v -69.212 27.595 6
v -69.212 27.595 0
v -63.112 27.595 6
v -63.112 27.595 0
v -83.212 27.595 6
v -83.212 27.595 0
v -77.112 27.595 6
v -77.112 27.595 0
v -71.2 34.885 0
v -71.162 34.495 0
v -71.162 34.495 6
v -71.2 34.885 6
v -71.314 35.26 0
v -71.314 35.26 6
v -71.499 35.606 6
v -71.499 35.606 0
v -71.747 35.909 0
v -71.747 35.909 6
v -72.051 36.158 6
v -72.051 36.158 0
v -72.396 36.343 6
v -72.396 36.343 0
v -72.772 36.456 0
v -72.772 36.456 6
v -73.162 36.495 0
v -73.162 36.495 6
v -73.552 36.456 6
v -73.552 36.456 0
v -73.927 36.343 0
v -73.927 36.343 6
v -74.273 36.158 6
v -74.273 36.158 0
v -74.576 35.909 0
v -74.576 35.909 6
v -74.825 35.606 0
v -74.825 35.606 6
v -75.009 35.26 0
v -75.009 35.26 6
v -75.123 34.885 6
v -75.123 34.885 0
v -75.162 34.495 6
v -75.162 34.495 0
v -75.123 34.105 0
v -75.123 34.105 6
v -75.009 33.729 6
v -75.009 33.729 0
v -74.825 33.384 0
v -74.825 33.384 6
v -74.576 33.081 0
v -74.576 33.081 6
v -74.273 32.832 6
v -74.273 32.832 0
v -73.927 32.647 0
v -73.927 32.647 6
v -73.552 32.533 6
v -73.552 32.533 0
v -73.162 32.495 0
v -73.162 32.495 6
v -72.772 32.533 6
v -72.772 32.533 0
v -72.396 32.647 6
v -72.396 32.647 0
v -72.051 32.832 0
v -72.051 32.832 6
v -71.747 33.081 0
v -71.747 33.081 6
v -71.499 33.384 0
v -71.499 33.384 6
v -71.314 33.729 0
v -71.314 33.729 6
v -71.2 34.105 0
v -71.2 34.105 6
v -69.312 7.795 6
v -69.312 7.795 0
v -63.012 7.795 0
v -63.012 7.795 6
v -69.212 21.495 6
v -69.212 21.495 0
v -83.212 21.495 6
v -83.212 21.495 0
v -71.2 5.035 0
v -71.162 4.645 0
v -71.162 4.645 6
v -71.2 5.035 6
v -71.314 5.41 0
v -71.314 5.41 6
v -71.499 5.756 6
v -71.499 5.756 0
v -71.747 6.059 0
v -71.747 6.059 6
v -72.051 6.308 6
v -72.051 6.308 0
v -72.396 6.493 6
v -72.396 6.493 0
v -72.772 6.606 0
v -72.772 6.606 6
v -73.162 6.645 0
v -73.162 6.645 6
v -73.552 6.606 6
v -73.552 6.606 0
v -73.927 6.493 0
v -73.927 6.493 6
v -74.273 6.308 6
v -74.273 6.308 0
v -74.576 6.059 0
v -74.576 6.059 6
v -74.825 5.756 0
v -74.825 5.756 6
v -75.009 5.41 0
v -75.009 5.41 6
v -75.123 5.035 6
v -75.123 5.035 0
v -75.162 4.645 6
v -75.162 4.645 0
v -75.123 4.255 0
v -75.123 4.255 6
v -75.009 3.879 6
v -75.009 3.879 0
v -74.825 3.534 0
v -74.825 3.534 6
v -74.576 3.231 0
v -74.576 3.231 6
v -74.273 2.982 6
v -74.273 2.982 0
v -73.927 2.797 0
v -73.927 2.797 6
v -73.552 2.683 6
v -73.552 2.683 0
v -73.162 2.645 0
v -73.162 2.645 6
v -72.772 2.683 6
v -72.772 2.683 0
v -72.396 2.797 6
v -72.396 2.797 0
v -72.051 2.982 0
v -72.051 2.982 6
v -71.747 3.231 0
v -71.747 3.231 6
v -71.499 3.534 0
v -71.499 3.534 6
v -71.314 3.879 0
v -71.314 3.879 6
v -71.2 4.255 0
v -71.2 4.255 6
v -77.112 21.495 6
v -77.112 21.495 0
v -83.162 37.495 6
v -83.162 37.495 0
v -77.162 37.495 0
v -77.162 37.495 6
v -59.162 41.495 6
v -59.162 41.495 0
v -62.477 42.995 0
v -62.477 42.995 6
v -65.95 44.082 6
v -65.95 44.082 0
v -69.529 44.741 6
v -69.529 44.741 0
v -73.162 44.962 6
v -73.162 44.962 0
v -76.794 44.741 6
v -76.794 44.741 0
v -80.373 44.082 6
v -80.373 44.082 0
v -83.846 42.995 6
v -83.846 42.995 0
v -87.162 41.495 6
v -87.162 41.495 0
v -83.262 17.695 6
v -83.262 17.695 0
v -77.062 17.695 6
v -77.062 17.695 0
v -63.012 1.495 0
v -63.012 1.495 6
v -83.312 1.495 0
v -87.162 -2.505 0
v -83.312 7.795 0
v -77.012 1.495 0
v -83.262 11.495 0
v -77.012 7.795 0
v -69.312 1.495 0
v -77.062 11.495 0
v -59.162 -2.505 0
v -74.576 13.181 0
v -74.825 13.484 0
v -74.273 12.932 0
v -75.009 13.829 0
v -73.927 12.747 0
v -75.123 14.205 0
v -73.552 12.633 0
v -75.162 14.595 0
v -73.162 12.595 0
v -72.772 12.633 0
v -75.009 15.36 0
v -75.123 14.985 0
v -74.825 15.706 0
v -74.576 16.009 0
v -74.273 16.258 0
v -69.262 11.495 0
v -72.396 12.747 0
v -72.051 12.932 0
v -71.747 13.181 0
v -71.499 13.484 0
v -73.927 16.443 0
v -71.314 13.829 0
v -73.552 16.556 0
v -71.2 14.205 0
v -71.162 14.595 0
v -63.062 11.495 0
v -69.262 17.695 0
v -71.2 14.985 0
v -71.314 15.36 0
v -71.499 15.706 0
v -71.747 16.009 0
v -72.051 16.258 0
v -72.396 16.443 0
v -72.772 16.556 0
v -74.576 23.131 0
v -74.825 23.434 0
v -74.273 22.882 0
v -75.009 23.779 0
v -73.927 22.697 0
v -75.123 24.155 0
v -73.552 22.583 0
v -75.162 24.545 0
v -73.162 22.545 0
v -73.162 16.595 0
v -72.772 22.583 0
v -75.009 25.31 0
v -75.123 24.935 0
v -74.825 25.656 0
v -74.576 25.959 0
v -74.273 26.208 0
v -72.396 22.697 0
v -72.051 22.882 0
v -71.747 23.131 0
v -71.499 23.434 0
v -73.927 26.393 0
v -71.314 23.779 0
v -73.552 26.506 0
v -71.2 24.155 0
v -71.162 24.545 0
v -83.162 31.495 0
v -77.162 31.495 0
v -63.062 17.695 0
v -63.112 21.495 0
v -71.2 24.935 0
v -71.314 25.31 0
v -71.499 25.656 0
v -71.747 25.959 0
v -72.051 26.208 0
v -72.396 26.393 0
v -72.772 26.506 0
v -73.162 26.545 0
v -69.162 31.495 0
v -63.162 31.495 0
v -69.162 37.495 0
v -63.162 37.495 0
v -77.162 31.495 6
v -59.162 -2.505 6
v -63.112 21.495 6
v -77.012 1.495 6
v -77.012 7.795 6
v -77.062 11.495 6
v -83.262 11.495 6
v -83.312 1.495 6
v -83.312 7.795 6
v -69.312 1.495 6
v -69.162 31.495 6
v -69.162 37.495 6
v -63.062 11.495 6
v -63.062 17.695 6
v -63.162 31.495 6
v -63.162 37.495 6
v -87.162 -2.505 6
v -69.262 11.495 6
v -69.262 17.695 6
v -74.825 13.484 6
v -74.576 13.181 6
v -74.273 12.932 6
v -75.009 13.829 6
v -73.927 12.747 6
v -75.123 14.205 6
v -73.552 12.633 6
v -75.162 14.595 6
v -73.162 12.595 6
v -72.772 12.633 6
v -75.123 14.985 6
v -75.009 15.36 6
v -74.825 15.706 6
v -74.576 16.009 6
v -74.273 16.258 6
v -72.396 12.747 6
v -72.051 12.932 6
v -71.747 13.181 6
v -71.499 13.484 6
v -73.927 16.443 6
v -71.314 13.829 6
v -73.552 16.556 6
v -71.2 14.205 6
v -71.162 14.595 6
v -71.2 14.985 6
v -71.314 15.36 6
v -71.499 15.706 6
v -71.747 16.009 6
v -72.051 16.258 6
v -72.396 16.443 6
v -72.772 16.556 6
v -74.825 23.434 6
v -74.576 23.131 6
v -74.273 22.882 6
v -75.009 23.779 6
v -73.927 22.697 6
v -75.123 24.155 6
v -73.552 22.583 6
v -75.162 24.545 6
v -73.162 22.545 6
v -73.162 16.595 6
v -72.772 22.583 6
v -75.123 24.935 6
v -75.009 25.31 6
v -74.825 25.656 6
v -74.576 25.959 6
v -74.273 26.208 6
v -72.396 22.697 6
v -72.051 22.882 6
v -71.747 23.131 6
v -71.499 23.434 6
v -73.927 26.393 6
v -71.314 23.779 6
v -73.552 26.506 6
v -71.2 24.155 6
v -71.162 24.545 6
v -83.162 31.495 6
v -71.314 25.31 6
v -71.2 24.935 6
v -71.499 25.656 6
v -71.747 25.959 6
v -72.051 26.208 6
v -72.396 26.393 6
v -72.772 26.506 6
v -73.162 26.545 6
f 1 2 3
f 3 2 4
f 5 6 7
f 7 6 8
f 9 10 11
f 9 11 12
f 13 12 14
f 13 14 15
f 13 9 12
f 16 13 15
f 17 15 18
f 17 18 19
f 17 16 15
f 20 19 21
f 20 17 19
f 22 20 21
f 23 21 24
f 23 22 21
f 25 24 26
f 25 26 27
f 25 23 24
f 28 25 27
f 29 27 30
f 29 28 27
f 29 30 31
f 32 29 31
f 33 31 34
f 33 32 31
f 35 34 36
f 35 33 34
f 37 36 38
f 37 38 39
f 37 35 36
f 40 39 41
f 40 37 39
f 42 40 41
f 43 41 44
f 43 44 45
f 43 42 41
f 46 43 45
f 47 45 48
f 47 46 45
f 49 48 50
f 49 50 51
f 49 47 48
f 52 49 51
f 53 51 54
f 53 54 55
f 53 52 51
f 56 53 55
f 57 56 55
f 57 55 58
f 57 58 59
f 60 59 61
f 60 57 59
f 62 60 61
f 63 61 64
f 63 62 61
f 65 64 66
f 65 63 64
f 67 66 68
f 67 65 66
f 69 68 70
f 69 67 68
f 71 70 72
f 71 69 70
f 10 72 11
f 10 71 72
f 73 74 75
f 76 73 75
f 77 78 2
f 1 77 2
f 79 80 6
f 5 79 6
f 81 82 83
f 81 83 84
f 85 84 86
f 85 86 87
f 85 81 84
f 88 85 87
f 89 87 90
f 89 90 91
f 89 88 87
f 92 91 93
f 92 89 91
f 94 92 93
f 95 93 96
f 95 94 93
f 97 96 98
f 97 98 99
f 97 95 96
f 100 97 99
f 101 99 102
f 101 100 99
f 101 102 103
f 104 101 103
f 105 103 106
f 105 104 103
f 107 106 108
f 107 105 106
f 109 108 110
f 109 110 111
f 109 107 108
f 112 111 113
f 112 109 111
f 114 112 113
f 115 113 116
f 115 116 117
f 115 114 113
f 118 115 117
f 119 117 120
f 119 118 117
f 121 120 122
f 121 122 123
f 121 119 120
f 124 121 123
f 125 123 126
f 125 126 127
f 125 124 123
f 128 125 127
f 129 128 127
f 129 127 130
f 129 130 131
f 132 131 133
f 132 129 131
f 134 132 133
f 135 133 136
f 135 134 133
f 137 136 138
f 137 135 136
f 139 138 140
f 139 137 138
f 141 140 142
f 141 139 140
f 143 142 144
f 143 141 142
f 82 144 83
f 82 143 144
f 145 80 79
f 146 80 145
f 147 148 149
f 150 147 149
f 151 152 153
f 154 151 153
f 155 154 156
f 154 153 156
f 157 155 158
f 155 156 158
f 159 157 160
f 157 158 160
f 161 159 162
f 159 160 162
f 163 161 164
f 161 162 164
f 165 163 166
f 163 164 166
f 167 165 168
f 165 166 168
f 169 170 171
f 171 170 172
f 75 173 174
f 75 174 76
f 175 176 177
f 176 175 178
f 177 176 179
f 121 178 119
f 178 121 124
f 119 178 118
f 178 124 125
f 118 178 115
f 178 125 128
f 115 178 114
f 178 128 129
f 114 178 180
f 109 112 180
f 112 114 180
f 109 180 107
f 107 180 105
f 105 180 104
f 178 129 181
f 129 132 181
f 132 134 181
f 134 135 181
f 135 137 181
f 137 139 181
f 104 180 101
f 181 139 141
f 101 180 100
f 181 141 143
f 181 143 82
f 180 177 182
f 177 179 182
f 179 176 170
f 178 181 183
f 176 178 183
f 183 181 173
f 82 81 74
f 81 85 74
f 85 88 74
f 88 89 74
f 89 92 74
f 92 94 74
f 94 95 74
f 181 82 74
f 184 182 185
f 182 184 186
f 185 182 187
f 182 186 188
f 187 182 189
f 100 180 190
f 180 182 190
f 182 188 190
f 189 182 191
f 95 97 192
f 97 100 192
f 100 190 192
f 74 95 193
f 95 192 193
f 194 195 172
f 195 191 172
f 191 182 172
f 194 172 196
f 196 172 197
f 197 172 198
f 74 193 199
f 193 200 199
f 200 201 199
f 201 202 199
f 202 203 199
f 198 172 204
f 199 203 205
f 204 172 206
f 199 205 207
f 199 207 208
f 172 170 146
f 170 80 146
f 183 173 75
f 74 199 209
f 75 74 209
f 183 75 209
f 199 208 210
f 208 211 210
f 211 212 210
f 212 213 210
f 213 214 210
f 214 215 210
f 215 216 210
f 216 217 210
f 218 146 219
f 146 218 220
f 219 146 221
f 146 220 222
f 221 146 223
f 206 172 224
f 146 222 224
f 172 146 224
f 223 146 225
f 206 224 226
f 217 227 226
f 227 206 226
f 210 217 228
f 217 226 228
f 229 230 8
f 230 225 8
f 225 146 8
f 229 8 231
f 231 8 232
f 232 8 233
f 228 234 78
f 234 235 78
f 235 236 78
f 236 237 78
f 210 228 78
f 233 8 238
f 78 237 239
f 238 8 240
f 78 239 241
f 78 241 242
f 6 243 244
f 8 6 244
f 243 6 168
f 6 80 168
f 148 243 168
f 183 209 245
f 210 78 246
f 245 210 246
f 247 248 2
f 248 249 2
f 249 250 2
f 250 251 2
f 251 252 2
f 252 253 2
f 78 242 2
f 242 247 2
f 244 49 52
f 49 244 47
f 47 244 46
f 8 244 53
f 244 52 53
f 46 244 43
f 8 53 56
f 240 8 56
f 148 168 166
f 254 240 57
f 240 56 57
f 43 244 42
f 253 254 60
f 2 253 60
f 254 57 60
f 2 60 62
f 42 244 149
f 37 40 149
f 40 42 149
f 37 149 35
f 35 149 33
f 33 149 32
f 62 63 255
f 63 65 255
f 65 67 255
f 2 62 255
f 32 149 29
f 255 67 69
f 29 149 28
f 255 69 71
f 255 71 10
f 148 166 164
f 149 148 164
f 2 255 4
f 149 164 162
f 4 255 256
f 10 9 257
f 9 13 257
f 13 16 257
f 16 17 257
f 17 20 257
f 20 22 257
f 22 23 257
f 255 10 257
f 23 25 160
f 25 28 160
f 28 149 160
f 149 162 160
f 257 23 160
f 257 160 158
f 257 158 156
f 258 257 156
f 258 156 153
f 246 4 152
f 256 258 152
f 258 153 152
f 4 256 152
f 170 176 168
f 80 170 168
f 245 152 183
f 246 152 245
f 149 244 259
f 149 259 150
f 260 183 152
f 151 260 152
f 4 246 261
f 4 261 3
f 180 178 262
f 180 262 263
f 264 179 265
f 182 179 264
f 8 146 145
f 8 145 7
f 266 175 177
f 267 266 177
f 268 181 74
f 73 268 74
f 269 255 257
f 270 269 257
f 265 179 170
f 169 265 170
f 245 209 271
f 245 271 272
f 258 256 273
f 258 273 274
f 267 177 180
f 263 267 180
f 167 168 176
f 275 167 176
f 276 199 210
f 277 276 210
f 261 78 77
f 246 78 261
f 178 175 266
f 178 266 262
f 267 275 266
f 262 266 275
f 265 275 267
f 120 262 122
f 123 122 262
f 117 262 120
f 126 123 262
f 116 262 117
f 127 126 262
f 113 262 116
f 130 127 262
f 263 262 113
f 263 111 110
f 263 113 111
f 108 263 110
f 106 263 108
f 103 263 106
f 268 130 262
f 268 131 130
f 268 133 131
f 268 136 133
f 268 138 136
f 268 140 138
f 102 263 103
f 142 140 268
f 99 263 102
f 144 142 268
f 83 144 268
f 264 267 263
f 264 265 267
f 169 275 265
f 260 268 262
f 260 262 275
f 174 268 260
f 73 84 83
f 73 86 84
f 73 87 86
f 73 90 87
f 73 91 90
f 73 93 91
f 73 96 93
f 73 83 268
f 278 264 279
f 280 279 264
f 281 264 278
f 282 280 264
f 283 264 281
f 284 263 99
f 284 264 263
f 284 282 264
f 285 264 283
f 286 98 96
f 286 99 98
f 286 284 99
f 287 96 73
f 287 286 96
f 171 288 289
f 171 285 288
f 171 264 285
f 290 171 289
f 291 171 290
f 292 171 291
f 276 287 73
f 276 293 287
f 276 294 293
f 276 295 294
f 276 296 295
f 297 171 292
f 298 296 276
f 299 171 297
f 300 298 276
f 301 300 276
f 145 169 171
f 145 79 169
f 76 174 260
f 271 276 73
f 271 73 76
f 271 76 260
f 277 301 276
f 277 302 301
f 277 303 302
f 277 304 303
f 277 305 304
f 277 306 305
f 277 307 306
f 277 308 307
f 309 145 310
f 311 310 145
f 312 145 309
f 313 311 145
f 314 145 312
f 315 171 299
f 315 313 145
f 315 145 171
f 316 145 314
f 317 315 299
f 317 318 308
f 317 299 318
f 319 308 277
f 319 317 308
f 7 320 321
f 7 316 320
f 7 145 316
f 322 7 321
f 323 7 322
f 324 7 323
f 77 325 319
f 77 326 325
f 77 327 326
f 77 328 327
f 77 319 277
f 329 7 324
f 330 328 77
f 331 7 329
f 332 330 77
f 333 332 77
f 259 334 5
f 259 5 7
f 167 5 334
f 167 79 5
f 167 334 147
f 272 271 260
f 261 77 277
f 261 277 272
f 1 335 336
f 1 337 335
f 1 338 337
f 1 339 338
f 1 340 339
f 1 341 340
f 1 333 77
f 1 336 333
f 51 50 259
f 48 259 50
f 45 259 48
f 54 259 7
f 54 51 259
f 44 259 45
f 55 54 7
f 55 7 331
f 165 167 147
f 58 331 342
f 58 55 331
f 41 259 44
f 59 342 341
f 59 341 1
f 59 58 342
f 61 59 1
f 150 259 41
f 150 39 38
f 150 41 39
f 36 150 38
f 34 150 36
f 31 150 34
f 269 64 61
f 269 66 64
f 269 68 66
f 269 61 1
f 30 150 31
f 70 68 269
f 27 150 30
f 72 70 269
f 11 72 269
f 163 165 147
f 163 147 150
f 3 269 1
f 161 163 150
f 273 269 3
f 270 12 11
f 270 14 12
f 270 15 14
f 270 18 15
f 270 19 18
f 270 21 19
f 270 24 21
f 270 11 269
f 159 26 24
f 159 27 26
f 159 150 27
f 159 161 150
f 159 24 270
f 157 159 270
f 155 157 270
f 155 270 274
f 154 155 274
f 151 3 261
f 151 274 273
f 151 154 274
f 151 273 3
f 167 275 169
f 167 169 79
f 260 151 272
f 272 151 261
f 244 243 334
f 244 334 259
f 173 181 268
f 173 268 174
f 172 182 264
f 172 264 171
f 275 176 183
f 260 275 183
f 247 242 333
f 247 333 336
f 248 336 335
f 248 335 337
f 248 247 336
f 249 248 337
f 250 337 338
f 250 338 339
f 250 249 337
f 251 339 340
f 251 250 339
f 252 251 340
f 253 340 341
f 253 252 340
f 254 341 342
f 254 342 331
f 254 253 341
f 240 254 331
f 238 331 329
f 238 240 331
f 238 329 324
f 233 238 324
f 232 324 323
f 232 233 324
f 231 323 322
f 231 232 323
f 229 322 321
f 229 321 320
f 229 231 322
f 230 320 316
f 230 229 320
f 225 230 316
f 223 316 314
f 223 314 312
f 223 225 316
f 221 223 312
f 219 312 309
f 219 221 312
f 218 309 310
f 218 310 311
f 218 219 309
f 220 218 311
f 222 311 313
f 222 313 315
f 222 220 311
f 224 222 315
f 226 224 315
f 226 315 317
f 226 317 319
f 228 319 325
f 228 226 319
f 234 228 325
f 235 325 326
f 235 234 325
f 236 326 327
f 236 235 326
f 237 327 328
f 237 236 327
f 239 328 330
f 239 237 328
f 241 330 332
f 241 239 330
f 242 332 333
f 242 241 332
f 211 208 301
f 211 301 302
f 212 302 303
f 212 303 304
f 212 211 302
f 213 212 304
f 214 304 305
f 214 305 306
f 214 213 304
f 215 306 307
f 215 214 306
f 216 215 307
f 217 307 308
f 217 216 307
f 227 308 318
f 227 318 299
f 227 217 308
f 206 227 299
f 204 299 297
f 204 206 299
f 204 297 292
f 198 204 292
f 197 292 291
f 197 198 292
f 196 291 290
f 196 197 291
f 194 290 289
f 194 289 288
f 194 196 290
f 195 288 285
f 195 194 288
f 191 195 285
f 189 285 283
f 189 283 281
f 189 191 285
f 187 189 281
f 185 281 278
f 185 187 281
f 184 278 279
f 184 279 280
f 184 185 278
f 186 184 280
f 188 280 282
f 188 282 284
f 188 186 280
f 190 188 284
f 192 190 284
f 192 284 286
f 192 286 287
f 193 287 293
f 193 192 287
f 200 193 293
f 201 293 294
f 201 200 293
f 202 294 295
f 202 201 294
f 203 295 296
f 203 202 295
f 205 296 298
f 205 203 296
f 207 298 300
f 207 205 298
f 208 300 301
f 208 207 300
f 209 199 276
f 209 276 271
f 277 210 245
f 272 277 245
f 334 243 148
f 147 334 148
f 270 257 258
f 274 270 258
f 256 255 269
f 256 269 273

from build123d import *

# Parameters (mm, degrees)
ESQUISSE3_R        = 2
ESQUISSE3_W        = 6
ESQUISSE3_H        = 6
ESQUISSE3_W_2      = 6.1
ESQUISSE3_H_2      = 6.1
ESQUISSE3_W_3      = 6.2
ESQUISSE3_H_3      = 6.2
ESQUISSE3_W_4      = 6.3
ESQUISSE3_H_4      = 6.3
BOSS_EXTRU_1_DEPTH = 6


with BuildPart() as part:
    # Esquisse3 → Boss.-Extru.1 (new body)
    with BuildSketch(Plane.XY):
        with BuildLine():
            Line((-87.161685907, 41.494801679), (-87.161685907, -2.505198321))
            Line((-87.161685907, -2.505198321), (-59.161685907, -2.505198321))
            Line((-59.161685907, -2.505198321), (-59.161685907, 41.494801679))
            ThreePointArc((-59.161685907, 41.494801679), (-73.161685907, 44.961803356), (-87.161685907, 41.494801679))
        make_face()
        with Locations((-73.161685907, 34.494801679)):
            Circle(ESQUISSE3_R, mode=Mode.SUBTRACT)
        with Locations((-73.161685907, 24.544801679)):
            Circle(ESQUISSE3_R, mode=Mode.SUBTRACT)
        with Locations((-73.161685907, 14.594801679)):
            Circle(ESQUISSE3_R, mode=Mode.SUBTRACT)
        with Locations((-73.161685907, 4.644801679)):
            Circle(ESQUISSE3_R, mode=Mode.SUBTRACT)
        with Locations((-80.161685907, 34.494801679)):
            Rectangle(ESQUISSE3_W, ESQUISSE3_H, mode=Mode.SUBTRACT)
        with Locations((-66.161685907, 34.494801679)):
            Rectangle(ESQUISSE3_W, ESQUISSE3_H, mode=Mode.SUBTRACT)
        with Locations((-80.161685907, 24.544801679)):
            Rectangle(ESQUISSE3_W_2, ESQUISSE3_H_2, mode=Mode.SUBTRACT)
        with Locations((-66.161685907, 24.544801679)):
            Rectangle(ESQUISSE3_W_2, ESQUISSE3_H_2, mode=Mode.SUBTRACT)
        with Locations((-80.161685907, 14.594801679)):
            Rectangle(ESQUISSE3_W_3, ESQUISSE3_H_3, mode=Mode.SUBTRACT)
        with Locations((-66.161685907, 14.594801679)):
            Rectangle(ESQUISSE3_W_3, ESQUISSE3_H_3, mode=Mode.SUBTRACT)
        with Locations((-80.161685907, 4.644801679)):
            Rectangle(ESQUISSE3_W_4, ESQUISSE3_H_4, mode=Mode.SUBTRACT)
        with Locations((-66.161685907, 4.644801679)):
            Rectangle(ESQUISSE3_W_4, ESQUISSE3_H_4, mode=Mode.SUBTRACT)
    extrude(amount=BOSS_EXTRU_1_DEPTH)


solid = part.part
